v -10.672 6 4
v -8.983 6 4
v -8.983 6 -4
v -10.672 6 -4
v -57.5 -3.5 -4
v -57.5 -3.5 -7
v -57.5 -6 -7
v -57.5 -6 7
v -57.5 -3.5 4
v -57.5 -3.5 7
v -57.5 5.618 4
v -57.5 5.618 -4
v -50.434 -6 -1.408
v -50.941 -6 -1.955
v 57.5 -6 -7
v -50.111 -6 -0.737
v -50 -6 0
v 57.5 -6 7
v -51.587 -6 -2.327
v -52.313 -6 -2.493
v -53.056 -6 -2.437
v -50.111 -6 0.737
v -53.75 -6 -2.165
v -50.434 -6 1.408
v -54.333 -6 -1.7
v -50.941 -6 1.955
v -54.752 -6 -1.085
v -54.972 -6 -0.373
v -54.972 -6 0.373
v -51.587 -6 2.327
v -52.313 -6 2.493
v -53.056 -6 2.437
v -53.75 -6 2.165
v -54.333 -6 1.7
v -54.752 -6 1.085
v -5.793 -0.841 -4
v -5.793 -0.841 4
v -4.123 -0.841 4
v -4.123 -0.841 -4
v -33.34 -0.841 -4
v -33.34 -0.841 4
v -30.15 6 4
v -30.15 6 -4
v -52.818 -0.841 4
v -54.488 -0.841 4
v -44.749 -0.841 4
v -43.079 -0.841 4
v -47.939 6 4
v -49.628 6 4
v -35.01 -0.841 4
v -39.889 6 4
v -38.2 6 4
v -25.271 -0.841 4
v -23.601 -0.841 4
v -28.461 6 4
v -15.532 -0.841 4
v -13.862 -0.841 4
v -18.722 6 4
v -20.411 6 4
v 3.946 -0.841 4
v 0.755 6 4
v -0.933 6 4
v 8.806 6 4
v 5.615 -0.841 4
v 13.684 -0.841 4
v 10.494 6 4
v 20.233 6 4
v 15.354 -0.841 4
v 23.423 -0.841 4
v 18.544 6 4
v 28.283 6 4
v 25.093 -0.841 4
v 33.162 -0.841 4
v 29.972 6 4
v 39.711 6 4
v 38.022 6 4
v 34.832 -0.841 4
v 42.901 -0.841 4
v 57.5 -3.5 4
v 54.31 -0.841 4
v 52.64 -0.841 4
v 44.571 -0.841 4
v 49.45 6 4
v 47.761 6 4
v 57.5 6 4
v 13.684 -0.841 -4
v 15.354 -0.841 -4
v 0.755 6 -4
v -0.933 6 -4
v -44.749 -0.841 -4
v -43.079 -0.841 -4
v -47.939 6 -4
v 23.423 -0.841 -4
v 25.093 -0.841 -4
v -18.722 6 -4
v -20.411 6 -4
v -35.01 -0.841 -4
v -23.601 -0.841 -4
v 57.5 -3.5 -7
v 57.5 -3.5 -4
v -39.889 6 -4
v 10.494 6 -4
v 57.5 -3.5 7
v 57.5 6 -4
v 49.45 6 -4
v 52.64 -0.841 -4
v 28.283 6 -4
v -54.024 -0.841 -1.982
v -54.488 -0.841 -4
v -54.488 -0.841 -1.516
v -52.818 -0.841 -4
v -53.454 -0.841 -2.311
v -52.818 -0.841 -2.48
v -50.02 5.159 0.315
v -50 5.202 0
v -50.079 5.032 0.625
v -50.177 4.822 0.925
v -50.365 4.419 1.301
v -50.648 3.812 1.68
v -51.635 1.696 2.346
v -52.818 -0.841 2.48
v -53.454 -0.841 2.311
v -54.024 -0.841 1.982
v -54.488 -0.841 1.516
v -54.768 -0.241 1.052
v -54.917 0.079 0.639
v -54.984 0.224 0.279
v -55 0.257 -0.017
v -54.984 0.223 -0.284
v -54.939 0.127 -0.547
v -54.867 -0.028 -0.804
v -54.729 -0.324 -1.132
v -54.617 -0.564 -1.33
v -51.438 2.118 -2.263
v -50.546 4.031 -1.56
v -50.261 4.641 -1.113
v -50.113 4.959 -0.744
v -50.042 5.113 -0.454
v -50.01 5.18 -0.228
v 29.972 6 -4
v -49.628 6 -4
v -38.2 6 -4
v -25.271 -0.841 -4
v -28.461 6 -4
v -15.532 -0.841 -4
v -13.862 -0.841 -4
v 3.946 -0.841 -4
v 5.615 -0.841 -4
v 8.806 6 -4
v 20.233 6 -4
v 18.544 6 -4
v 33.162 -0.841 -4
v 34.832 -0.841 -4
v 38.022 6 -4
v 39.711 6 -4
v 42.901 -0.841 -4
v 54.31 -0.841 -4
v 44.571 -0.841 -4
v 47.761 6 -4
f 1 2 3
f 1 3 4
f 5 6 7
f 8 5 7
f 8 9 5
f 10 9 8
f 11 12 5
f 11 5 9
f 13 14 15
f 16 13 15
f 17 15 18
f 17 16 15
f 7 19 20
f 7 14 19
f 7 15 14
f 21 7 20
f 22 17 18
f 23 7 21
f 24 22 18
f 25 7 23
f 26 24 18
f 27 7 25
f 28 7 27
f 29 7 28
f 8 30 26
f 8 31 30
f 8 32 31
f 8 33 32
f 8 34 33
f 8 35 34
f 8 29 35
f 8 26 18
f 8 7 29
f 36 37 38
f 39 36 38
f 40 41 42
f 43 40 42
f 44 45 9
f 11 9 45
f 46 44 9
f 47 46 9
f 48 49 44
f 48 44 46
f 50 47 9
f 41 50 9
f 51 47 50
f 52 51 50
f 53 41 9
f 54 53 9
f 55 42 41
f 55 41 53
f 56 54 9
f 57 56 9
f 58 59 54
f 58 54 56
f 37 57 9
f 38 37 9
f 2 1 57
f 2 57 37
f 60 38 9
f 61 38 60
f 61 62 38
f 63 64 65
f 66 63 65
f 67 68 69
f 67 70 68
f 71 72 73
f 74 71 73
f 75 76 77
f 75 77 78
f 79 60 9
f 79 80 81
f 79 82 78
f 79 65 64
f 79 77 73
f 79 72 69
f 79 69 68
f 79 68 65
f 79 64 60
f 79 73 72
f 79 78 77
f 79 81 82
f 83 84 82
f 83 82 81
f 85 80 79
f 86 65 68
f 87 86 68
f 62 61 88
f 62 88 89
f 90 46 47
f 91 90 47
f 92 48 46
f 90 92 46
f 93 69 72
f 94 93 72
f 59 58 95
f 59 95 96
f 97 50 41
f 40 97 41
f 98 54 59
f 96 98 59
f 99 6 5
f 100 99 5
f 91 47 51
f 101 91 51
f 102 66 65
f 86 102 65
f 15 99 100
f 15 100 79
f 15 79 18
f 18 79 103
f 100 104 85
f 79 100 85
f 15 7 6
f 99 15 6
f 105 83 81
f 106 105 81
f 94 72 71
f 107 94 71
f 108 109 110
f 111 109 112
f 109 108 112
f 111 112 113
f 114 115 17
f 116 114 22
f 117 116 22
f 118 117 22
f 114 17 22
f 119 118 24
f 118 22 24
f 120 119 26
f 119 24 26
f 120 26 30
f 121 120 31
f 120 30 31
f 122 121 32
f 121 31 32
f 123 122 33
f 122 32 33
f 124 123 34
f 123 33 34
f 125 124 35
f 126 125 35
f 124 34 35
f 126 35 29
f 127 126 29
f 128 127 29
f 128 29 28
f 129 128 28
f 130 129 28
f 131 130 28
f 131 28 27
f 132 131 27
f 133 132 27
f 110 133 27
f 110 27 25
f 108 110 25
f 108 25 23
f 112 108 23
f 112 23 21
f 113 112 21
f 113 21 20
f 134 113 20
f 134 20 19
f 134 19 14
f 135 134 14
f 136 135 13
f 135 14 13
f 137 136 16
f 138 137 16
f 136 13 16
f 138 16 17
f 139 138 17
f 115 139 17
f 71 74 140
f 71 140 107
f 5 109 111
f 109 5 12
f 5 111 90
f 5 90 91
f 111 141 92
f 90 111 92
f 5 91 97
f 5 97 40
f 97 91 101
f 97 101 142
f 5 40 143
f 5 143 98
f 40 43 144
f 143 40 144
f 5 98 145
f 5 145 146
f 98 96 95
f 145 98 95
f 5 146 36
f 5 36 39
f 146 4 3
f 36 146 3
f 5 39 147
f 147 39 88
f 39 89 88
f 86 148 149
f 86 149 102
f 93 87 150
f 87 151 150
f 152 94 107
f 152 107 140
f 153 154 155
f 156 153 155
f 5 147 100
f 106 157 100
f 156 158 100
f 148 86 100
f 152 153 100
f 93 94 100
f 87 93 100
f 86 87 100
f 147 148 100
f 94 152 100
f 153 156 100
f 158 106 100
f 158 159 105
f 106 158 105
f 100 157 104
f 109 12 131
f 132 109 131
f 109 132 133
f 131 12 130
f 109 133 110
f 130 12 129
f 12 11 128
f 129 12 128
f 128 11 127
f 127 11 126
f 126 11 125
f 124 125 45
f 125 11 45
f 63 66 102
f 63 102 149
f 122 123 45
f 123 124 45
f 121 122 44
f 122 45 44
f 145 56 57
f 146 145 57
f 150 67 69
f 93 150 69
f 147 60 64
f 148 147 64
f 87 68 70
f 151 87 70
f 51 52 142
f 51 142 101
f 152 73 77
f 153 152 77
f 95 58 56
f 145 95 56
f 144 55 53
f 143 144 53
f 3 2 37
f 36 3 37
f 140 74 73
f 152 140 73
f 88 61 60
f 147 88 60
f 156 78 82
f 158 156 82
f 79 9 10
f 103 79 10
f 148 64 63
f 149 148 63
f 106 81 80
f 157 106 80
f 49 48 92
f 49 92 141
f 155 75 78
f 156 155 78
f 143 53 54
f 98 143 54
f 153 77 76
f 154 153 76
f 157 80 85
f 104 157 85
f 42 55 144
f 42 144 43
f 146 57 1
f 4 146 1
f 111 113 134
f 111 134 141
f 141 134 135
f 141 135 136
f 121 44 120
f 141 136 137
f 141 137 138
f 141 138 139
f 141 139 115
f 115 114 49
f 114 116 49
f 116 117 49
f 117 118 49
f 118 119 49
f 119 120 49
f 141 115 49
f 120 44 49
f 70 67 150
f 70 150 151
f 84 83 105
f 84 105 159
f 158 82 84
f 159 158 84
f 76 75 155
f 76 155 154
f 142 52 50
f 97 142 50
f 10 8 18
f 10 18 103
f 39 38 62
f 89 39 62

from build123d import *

# Parameters (mm, degrees)
BOSS_EXTRUDE4_DEPTH = 4
CUT_EXTRUDE7_DEPTH  = 5
LPATTERN2_COUNT     = 13
LPATTERN2_PITCH     = 9.7389
SKETCH10_W          = 14
SKETCH10_H          = 2.5
BOSS_EXTRUDE5_DEPTH = 115
SKETCH11_R          = 2.5
CUT_EXTRUDE8_DEPTH  = 13


with BuildPart() as part:
    # Sketch9 → Boss-Extrude4 (new body, symmetric)
    with BuildSketch(Plane.XY):
        Polygon((57.5, 6), (49.449989311, 6), (52.64, -0.841), (54.309989311, -0.841), align=None)
        Polygon((52.64, -0.841), (49.449989311, 6), (-57.5, 6), (-57.5, -6), (57.5, -6), (57.5, 6), (54.309989311, -0.841), align=None)
    extrude(amount=BOSS_EXTRUDE4_DEPTH, both=True)

    # Sketch9<4> → Cut-Extrude7 (cut, symmetric)
    with BuildSketch(Plane.XY):
        Polygon((57.5, 6), (49.449989311, 6), (52.64, -0.841), (54.309989311, -0.841), align=None)
    cut_extrude7 = extrude(amount=CUT_EXTRUDE7_DEPTH, both=True, mode=Mode.SUBTRACT)

    # LPattern2: Cut-Extrude7 ×13
    with Locations(*[(-i * LPATTERN2_PITCH, 0, 0) for i in range(1, LPATTERN2_COUNT)]):
        add(cut_extrude7, mode=Mode.SUBTRACT)

    # Sketch10 → Boss-Extrude5 (add)
    with BuildSketch(Plane.ZY.offset(57.5)):
        with Locations((0, -4.75)):
            Rectangle(SKETCH10_W, SKETCH10_H)
    extrude(amount=-BOSS_EXTRUDE5_DEPTH)

    # Sketch11 → Cut-Extrude8 (cut, through all)
    with BuildSketch(Plane.XZ.offset(6)):
        with Locations((-52.5, 0)):
            Circle(SKETCH11_R)
    extrude(amount=-CUT_EXTRUDE8_DEPTH, mode=Mode.SUBTRACT)


solid = part.part
